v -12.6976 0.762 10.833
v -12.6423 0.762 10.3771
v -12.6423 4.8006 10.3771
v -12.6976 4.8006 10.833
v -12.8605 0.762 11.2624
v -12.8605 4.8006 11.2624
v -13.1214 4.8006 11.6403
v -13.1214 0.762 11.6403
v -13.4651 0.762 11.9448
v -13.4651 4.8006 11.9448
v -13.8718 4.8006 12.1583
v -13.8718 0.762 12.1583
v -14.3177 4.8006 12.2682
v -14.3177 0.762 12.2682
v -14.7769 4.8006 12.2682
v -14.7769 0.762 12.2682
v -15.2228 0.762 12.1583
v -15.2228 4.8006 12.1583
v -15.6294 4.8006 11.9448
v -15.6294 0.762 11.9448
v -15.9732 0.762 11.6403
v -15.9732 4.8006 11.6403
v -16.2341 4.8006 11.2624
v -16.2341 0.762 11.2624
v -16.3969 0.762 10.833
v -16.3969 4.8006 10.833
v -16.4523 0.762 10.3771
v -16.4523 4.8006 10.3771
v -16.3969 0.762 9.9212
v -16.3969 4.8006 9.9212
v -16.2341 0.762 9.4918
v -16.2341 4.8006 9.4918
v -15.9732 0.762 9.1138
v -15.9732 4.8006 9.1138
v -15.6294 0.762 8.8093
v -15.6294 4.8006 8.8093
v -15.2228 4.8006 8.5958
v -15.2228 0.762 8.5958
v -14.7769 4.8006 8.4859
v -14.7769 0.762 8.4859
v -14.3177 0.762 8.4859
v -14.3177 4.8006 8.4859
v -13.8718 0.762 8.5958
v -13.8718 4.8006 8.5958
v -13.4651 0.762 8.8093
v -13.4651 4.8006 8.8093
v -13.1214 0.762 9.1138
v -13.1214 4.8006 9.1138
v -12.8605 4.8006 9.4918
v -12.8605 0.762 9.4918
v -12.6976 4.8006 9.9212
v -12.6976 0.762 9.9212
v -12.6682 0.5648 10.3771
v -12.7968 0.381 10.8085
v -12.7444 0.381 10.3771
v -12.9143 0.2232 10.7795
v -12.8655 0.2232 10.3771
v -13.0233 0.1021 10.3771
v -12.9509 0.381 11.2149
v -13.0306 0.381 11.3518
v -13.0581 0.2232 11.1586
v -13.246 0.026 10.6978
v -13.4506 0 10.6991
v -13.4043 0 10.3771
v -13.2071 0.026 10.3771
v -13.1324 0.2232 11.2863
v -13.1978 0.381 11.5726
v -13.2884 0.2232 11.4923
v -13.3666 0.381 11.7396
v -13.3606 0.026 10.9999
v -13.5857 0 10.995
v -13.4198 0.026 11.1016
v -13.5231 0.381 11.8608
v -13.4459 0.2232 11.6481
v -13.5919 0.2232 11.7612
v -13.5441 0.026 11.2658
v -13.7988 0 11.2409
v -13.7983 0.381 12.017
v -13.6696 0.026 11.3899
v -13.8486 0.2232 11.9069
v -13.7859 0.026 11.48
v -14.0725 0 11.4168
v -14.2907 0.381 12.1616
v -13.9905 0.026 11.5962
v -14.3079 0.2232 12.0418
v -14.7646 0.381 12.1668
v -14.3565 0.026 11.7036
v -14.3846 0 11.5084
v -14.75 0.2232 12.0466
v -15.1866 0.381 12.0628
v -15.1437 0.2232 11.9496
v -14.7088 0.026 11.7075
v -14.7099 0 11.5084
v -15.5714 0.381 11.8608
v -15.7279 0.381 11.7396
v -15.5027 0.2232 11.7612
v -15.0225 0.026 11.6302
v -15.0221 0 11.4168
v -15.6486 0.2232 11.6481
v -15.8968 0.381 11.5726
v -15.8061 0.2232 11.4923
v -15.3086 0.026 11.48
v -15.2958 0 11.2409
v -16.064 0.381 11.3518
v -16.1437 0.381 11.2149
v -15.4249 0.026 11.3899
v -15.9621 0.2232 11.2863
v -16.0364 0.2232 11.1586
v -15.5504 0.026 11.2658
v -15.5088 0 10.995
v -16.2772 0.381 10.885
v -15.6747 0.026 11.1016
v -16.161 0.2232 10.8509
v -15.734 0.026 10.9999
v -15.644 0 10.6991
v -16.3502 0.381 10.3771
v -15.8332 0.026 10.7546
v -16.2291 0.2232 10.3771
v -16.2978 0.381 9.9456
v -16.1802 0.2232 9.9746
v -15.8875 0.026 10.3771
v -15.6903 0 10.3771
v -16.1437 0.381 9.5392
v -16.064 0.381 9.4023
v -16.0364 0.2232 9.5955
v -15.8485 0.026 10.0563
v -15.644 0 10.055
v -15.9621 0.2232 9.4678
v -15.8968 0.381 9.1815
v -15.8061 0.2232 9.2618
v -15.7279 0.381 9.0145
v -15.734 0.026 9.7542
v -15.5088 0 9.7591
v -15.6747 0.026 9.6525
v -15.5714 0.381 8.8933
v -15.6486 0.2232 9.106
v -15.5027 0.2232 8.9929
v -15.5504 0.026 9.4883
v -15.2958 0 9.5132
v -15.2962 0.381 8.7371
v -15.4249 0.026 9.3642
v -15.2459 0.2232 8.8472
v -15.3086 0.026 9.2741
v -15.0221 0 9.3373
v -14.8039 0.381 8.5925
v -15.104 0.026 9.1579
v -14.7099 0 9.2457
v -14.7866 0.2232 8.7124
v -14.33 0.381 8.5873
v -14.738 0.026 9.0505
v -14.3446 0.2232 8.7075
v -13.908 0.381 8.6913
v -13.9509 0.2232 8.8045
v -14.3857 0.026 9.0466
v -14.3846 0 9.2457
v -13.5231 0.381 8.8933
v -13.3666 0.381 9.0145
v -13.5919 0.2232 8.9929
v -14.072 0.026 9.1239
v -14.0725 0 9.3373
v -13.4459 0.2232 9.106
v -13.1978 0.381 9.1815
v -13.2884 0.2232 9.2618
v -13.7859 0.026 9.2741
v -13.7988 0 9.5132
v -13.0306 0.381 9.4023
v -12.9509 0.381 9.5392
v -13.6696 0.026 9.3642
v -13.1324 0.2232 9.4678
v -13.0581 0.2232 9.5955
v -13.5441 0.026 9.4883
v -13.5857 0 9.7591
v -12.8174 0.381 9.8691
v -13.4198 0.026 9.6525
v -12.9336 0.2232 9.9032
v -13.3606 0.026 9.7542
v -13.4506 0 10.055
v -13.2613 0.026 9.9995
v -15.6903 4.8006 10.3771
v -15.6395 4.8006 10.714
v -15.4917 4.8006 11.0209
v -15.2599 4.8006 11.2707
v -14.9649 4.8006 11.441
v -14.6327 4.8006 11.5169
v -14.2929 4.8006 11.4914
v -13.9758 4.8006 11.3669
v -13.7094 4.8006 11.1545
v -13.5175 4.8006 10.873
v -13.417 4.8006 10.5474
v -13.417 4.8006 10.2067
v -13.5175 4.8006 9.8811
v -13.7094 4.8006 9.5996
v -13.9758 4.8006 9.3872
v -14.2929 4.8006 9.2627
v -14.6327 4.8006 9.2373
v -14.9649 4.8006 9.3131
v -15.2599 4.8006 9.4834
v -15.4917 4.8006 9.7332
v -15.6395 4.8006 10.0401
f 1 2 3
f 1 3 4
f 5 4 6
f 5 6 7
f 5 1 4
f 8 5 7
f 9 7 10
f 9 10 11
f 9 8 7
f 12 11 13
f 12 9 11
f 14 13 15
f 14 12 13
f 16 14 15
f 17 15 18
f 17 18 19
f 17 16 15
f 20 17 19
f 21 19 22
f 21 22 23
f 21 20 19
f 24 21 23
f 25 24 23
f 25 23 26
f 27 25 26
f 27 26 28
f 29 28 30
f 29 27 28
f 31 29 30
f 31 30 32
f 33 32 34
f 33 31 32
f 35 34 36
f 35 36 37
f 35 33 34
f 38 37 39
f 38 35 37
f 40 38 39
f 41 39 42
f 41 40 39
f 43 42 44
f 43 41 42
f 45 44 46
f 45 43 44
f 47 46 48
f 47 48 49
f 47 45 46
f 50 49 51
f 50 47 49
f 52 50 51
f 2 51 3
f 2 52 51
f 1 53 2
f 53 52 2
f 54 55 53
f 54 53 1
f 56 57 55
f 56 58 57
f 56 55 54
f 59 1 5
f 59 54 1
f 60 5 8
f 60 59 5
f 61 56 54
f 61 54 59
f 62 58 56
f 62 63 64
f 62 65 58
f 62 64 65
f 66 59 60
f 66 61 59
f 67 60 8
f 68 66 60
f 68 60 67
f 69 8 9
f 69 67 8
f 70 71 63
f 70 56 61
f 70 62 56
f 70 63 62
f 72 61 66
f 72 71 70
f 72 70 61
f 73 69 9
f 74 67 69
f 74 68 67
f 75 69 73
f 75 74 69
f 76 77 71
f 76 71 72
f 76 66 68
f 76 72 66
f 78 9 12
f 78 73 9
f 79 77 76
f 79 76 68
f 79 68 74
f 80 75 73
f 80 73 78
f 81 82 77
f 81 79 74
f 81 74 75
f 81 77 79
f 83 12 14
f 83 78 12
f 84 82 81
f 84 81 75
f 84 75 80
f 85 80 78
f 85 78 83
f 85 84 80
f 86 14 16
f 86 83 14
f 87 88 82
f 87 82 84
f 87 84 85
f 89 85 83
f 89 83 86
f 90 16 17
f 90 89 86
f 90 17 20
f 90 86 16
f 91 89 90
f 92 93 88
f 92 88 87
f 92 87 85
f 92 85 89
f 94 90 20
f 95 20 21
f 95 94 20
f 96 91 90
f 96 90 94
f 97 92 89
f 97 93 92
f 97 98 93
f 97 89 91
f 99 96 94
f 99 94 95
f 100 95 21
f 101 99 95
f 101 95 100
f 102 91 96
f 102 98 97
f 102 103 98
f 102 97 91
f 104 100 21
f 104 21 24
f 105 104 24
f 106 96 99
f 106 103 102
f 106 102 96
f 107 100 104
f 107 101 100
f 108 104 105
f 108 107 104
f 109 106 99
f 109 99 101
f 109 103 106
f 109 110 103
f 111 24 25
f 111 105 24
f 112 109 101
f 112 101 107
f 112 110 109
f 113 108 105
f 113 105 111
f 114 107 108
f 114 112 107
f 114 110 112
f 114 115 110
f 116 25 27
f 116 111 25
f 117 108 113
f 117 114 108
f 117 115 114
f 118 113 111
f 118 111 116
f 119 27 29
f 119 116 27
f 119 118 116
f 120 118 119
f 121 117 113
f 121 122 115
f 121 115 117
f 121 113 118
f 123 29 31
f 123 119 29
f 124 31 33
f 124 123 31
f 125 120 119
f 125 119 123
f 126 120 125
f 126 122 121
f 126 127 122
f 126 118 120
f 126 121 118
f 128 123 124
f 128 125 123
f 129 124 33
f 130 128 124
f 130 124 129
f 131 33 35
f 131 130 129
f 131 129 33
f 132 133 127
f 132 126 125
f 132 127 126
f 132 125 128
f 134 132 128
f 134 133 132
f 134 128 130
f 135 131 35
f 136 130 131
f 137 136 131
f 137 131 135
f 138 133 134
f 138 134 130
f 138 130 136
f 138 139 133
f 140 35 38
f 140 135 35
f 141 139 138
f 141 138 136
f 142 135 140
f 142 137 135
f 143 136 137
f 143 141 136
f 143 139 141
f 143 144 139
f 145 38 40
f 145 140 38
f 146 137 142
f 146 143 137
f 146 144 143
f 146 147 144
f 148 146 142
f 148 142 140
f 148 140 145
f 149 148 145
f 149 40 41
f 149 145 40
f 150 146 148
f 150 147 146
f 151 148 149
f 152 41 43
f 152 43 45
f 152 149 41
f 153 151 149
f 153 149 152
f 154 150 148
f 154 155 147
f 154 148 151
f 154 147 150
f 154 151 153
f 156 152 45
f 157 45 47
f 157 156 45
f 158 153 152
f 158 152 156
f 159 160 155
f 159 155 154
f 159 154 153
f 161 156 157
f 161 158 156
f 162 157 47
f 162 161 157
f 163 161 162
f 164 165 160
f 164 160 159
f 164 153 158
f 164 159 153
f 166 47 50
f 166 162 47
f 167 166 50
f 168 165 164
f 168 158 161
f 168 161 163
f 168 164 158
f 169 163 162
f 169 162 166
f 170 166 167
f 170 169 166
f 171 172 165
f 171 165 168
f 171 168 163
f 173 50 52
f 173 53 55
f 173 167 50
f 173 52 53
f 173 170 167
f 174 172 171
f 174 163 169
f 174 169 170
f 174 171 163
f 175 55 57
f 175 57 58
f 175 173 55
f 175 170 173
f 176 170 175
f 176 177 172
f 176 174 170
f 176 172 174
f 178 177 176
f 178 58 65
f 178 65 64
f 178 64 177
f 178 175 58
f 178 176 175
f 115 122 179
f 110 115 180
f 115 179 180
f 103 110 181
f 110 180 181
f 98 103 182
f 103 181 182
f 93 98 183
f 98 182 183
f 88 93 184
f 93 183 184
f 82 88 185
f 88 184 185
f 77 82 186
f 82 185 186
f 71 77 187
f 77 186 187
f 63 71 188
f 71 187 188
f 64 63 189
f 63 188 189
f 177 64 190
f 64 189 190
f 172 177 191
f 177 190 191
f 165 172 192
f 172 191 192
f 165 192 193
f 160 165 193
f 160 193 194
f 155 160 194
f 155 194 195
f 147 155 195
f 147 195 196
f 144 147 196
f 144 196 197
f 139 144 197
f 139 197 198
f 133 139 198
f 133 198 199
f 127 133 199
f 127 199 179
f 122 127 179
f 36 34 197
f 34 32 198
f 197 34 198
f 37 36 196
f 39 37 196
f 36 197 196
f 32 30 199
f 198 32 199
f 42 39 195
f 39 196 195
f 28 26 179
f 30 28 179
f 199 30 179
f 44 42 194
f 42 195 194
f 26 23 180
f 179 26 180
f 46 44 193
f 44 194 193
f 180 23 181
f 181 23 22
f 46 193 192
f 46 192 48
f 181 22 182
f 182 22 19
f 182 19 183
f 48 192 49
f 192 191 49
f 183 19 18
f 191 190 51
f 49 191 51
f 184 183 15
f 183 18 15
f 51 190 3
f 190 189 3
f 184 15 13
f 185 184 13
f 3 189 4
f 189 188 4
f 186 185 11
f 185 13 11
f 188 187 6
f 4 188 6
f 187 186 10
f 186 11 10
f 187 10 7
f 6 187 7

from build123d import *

# Parameters (mm, degrees)
F0_R     = 1.905
F1_DEPTH = 4.8006
F2_R     = 0.762
F4_D     = 2.286


with BuildPart() as f1:
    # F0 (on Front) → F1 (new body)
    with BuildSketch(Plane.XZ):
        with Locations((-14.547273, 10.377054)):
            Circle(F0_R)
    extrude(amount=-F1_DEPTH)

    # F2
    f2_edges = [f1.edges().sort_by_distance(p)[0] for p in [
        (-16.452273, 0, 10.377054),
    ]]
    fillet(f2_edges, radius=F2_R)

    # F4 (through all)
    with Locations(Plane.XZ):
        with Locations((-14.547273, 10.377054)):
            Hole(F4_D / 2)


solid = f1.part
